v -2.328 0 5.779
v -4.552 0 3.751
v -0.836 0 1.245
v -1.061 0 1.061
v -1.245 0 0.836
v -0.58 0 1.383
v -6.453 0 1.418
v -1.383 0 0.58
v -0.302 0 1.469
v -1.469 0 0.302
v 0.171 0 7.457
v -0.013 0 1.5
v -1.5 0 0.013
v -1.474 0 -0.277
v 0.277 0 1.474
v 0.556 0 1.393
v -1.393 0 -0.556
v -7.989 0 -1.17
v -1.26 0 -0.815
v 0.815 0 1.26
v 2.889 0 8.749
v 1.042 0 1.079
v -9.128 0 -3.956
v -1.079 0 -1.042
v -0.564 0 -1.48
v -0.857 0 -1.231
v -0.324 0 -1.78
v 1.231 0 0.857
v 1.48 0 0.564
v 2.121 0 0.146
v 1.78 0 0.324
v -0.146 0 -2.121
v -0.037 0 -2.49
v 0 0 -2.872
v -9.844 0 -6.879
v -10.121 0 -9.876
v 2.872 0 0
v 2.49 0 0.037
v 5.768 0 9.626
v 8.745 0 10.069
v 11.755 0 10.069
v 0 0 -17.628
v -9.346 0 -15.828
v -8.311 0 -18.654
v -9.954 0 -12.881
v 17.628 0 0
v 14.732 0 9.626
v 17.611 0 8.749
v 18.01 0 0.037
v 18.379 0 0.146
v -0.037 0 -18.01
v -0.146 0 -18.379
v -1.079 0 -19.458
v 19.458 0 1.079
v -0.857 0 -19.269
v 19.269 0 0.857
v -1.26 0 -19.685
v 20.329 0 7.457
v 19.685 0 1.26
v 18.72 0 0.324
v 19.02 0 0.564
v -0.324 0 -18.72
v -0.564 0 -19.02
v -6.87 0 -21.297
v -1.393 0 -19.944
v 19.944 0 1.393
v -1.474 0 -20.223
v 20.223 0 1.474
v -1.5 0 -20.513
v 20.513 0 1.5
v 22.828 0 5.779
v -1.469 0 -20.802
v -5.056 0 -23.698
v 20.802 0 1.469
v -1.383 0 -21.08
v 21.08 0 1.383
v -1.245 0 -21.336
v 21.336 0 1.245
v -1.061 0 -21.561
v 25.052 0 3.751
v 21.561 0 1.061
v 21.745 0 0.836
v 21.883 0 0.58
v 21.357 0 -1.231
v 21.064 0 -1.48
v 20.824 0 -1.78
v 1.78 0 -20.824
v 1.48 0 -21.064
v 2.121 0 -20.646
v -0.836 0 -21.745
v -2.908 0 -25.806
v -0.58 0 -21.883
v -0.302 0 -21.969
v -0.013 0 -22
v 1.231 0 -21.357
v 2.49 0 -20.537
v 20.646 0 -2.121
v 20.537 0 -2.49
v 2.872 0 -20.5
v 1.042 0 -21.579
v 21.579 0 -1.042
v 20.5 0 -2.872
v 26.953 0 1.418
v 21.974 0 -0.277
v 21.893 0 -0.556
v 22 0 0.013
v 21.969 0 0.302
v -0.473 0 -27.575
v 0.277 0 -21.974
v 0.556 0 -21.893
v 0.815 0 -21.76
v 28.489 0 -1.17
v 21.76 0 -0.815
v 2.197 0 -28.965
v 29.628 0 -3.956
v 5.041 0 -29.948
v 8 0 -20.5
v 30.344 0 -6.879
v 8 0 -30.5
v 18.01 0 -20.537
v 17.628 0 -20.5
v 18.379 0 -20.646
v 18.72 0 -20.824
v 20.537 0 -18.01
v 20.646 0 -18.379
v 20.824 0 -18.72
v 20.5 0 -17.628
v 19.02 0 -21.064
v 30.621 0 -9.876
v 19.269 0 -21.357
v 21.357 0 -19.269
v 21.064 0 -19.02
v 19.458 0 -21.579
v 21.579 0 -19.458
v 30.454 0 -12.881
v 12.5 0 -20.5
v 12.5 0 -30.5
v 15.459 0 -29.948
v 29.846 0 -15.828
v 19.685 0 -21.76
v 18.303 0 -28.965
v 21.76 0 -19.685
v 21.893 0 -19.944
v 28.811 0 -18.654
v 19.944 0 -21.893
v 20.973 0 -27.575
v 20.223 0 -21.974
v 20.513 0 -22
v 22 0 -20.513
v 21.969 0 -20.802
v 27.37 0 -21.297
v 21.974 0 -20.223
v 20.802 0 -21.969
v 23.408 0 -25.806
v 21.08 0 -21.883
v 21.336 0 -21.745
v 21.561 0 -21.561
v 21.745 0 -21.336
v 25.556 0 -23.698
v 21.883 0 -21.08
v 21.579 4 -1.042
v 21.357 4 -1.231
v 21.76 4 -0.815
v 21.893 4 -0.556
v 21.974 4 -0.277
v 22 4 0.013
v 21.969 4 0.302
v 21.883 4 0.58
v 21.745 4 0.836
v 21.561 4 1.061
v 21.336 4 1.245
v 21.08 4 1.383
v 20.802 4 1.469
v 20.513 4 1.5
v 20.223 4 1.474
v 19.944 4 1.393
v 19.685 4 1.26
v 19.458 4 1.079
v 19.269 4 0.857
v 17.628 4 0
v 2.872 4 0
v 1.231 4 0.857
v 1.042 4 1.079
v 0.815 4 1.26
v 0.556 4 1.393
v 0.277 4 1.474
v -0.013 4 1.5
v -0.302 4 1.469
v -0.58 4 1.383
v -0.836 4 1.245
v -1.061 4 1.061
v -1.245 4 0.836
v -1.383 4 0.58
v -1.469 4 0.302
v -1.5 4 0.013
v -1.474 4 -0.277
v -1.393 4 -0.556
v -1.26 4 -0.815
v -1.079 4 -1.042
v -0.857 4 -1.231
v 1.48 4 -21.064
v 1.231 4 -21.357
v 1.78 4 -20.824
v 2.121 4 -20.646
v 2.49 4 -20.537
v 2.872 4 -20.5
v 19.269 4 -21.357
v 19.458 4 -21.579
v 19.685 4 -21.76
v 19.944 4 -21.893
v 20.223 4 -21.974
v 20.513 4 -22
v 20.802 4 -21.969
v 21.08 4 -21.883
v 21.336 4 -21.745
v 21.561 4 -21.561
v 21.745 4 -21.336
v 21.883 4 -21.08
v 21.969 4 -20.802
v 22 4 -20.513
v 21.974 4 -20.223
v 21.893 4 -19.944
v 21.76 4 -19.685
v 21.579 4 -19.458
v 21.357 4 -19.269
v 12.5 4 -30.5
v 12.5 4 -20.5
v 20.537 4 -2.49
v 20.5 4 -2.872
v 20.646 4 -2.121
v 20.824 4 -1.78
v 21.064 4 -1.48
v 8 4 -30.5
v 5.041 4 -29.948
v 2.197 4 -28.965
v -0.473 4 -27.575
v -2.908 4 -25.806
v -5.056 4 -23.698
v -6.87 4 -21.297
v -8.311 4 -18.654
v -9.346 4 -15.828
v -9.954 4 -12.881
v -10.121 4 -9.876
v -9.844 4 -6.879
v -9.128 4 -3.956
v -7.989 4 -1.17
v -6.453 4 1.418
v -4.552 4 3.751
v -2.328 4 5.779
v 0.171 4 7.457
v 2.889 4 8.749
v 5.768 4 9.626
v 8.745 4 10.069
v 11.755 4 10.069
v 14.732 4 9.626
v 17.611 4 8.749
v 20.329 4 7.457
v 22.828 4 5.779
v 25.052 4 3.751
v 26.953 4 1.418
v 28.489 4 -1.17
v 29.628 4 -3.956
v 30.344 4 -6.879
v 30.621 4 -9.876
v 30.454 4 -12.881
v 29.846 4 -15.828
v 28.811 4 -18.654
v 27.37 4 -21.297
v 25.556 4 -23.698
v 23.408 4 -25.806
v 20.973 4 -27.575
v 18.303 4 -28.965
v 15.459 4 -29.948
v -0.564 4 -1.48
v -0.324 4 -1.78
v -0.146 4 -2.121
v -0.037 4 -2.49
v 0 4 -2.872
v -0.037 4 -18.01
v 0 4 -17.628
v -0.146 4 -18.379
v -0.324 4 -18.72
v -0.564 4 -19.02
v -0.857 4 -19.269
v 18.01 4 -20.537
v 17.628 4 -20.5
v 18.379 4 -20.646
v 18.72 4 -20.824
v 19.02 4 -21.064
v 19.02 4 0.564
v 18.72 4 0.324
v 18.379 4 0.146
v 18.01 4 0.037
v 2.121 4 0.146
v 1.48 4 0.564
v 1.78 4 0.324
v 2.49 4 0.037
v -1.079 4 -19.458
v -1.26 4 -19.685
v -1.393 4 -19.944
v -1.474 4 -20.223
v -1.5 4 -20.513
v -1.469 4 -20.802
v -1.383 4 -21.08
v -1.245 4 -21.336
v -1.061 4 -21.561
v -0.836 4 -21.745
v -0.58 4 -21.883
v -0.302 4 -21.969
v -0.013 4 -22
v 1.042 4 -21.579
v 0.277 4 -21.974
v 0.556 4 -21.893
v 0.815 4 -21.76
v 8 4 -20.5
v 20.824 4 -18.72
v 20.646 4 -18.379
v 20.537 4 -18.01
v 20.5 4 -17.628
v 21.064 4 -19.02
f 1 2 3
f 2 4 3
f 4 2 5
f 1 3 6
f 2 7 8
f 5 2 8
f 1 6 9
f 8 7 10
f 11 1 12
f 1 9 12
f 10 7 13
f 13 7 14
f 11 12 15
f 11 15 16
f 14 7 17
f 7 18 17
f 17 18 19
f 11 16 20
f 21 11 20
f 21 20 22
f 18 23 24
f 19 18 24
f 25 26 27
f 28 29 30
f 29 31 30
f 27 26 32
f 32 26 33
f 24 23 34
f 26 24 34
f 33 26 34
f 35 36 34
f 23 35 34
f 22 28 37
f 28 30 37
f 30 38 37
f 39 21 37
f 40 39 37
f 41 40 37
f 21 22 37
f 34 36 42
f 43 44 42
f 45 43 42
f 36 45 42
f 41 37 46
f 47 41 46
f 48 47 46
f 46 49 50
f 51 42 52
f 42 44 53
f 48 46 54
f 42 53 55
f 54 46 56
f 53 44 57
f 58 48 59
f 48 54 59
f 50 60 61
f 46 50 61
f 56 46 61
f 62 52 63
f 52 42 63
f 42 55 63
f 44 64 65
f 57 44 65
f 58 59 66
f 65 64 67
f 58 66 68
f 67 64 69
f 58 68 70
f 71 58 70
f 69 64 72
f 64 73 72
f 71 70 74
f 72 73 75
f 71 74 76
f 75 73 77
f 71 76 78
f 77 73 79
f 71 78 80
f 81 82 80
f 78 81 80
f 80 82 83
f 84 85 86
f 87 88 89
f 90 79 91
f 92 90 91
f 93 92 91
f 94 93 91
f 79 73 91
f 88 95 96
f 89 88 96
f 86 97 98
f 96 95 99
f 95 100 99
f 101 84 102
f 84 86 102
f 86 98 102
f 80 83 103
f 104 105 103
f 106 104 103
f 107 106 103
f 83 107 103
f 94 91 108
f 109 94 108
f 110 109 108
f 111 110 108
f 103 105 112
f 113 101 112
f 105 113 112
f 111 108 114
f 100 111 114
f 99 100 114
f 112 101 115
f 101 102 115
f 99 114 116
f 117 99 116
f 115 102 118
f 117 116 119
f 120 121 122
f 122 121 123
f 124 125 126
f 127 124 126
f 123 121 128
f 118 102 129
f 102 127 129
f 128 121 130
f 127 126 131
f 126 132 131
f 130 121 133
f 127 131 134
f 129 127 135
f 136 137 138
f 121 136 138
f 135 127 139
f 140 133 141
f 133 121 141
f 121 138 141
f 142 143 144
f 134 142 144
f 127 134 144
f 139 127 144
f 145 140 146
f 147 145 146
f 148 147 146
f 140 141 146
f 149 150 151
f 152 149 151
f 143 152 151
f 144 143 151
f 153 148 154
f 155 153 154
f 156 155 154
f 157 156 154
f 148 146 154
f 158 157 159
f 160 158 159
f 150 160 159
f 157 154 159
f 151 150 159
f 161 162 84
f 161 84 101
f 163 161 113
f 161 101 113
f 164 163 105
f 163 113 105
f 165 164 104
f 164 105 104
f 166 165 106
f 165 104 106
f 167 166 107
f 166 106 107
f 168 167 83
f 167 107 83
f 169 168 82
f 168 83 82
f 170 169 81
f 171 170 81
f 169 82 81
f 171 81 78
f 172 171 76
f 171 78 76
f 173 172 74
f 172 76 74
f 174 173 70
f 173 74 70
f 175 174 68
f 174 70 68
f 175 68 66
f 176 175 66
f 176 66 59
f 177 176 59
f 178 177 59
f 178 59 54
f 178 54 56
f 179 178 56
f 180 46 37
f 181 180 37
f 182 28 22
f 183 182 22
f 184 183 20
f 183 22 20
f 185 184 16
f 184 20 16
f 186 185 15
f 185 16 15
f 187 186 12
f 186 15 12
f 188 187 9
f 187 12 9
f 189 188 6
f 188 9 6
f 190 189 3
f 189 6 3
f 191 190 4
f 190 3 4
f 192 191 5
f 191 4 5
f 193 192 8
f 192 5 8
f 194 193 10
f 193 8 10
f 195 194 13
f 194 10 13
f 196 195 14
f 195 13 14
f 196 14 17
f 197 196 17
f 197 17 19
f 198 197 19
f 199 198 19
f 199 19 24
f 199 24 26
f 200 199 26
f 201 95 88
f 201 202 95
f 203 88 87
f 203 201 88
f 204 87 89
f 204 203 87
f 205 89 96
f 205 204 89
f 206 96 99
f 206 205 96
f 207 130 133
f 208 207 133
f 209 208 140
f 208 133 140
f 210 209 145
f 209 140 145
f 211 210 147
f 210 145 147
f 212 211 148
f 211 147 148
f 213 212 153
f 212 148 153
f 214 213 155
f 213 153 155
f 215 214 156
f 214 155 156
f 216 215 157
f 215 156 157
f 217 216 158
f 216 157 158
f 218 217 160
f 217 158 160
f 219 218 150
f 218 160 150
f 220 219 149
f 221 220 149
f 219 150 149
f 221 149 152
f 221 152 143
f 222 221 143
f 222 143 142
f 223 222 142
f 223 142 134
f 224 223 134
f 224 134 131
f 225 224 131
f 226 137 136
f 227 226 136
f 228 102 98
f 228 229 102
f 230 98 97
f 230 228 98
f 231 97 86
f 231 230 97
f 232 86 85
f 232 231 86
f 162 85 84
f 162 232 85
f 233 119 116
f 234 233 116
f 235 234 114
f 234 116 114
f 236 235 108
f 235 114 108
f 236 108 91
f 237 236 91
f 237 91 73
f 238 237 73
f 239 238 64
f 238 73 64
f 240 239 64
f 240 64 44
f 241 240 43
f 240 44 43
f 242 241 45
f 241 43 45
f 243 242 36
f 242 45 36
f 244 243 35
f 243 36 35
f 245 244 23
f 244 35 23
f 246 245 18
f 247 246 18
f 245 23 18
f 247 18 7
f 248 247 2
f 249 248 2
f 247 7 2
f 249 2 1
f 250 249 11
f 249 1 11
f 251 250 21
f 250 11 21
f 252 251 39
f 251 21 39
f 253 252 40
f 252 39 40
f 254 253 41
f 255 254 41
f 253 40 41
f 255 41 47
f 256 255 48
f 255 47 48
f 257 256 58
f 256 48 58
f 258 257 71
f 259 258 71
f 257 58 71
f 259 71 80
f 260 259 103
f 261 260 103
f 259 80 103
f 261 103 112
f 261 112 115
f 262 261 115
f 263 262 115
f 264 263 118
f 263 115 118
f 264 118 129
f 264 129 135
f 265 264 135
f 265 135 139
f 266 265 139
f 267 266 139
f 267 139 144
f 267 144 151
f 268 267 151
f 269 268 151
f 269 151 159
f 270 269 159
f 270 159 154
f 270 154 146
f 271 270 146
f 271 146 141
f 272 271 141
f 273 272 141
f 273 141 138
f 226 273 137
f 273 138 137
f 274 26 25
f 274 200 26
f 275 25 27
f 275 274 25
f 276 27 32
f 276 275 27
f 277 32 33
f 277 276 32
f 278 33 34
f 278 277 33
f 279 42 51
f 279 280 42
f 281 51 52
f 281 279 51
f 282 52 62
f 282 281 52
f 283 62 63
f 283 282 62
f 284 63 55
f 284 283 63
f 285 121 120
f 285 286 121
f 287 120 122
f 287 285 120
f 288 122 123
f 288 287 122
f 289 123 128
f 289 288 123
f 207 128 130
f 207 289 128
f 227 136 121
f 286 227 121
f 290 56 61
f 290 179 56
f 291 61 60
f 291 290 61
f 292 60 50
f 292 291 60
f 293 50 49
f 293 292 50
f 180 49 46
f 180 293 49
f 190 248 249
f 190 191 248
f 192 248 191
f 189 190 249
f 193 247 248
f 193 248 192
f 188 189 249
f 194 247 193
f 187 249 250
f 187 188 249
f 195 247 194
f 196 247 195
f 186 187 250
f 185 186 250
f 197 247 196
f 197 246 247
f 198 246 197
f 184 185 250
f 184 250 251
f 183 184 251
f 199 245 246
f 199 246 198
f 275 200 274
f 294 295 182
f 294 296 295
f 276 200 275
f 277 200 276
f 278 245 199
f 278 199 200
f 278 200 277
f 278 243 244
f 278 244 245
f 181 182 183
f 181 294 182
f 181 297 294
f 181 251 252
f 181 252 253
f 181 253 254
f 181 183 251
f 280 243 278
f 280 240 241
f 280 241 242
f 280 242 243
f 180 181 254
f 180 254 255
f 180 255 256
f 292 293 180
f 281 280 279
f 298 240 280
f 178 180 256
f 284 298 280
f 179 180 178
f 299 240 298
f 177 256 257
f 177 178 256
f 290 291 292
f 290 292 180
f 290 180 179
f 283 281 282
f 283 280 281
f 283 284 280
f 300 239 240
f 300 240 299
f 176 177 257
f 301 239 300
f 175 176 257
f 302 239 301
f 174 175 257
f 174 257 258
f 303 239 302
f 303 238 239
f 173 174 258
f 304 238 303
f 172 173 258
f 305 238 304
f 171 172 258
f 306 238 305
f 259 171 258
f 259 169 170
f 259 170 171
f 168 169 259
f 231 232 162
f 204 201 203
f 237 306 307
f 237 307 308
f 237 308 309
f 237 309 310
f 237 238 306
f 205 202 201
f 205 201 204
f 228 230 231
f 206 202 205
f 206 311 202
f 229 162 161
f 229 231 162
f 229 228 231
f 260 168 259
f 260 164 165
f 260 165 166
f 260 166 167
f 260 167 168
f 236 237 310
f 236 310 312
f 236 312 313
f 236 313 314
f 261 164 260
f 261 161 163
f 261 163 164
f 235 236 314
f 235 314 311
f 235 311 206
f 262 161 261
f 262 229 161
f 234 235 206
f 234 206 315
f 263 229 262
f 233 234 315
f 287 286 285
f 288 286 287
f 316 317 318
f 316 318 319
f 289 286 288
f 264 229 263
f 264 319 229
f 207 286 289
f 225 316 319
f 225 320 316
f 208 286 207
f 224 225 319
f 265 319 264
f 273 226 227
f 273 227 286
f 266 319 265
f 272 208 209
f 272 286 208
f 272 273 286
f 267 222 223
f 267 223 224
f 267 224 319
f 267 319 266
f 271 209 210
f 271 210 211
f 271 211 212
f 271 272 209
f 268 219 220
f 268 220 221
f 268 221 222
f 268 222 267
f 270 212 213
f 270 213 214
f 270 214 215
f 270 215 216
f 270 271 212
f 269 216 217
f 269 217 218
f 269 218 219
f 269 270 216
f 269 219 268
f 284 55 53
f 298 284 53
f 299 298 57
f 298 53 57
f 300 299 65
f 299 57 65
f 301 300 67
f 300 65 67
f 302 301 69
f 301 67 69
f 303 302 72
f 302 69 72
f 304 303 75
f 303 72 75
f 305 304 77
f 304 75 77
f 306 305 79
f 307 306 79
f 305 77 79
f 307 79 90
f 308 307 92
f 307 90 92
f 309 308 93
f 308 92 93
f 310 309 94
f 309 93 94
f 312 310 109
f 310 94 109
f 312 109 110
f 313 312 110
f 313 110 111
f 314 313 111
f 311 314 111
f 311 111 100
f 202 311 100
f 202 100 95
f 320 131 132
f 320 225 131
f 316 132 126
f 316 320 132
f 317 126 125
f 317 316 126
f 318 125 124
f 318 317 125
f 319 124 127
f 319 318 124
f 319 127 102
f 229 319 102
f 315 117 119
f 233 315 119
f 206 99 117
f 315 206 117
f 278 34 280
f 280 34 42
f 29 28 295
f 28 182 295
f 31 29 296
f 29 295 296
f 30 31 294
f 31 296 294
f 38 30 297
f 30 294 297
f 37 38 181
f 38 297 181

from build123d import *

# Parameters (mm, degrees)
BOSS_EXTRUDE1_DEPTH = 4
FILLET1_R           = 2


with BuildPart() as part:
    # Sketch1 → Boss-Extrude1 (new body)
    with BuildSketch(Plane(origin=(0, 0, 0), x_dir=(1, 0, 0), z_dir=(0, 1, 0))):
        with BuildLine():
            ThreePointArc((1.5, 0), (-1.060660172, -1.060660172), (0, 1.5))
            Line((0, 1.5), (0, 19))
            ThreePointArc((0, 19), (-1.060660172, 21.560660172), (1.5, 20.5))
            Line((1.5, 20.5), (8, 20.5))
            Line((8, 20.5), (8, 30.5))
            ThreePointArc((8, 30.5), (10.25, -10.124616561), (12.5, 30.5))
            Line((12.5, 30.5), (12.5, 20.5))
            Line((12.5, 20.5), (19, 20.5))
            ThreePointArc((19, 20.5), (21.560660172, 21.560660172), (20.5, 19))
            Line((20.5, 19), (20.5, 1.5))
            ThreePointArc((20.5, 1.5), (21.560660172, -1.060660172), (19, 0))
            Line((19, 0), (1.5, 0))
        make_face()
    extrude(amount=BOSS_EXTRUDE1_DEPTH)

    # Fillet1
    fillet1_edges = [part.edges().sort_by_distance(p)[0] for p in [
        (0, 2, -19),
        (0, 2, -1.5),
        (1.5, 2, 0),
        (19, 2, 0),
        (20.5, 2, -1.5),
        (20.5, 2, -19),
        (19, 2, -20.5),
        (1.5, 2, -20.5),
    ]]
    fillet(fillet1_edges, radius=FILLET1_R)


solid = part.part
